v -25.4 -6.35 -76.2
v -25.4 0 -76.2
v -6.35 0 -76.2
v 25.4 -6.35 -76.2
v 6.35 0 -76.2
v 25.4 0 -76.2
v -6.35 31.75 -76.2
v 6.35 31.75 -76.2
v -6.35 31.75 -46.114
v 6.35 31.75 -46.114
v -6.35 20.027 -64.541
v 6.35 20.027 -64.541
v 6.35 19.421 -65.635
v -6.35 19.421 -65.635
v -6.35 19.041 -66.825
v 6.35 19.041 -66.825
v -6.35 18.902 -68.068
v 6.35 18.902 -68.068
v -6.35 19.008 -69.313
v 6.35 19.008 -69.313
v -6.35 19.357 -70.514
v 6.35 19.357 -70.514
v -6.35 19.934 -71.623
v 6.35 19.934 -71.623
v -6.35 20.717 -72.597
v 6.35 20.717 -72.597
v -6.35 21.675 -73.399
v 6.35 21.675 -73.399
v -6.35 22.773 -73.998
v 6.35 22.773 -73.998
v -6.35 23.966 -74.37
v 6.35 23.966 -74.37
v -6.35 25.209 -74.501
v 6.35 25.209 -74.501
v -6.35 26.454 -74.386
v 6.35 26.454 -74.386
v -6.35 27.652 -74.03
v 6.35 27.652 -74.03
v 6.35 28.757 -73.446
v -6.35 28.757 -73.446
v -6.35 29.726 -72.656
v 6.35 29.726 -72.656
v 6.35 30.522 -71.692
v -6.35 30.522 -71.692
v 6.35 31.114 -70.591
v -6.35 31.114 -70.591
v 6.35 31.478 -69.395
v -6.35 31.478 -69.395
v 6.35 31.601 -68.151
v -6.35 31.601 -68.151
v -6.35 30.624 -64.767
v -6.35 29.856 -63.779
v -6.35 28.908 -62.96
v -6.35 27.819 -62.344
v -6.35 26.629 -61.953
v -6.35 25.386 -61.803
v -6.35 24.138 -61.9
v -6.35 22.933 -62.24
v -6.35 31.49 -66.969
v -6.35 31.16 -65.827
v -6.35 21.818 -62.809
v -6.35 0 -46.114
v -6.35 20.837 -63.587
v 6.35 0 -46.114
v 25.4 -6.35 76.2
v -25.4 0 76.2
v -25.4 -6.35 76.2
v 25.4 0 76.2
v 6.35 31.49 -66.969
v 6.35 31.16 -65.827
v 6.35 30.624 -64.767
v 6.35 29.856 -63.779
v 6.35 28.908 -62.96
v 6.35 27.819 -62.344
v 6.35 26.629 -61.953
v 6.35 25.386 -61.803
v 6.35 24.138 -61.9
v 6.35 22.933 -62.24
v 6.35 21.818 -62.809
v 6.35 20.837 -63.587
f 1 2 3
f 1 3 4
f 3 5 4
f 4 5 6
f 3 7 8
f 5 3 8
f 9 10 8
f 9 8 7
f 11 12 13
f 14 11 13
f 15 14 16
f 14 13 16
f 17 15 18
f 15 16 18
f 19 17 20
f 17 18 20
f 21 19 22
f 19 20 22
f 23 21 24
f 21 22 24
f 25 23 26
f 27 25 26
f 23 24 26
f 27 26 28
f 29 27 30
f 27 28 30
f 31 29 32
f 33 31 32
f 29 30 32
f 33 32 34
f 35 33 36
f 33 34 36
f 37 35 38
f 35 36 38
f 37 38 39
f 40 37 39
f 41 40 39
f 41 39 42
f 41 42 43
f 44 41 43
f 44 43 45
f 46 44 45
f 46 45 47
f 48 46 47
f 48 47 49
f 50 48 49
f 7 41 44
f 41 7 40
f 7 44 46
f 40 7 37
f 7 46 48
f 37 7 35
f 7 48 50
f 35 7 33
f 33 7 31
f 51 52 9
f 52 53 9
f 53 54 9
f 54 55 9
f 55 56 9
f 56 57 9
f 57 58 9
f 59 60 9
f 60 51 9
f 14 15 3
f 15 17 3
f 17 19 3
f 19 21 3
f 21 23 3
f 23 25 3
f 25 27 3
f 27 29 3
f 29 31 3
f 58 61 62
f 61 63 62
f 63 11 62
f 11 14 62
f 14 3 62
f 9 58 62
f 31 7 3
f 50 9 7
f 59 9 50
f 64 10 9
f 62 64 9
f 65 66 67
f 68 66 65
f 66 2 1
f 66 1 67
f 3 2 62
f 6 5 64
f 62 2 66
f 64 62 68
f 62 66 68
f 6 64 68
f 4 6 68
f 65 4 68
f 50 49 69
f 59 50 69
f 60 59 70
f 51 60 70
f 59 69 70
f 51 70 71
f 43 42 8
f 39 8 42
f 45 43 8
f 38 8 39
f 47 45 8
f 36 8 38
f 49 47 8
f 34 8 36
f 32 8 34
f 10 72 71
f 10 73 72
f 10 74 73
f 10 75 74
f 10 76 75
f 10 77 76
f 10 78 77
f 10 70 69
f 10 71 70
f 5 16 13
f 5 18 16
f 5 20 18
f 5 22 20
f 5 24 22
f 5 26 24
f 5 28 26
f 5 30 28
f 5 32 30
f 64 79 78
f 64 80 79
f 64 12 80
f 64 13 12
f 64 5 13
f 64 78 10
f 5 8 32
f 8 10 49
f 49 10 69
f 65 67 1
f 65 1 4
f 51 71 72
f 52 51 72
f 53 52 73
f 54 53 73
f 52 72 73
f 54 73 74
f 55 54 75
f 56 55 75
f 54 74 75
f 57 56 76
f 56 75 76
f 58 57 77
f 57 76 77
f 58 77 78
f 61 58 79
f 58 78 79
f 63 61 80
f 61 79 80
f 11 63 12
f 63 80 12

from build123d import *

# Parameters (mm, degrees)
F0_W     = 50.8
F0_H     = 152.4
F1_DEPTH = 6.35
F2_W     = 12.7
F2_H     = 30.0863
F3_DEPTH = 31.75
F6_DEPTH = 31.751


with BuildPart() as f1:
    # F0 (on Front) → F1 (new body)
    with BuildSketch(Plane.XZ):
        Rectangle(F0_W, F0_H)
    extrude(amount=F1_DEPTH)

    # F2 (on face) → F3 (join)
    with BuildSketch(Plane(origin=(0, 0, 0), x_dir=(-1, 0, 0), z_dir=(0, 1, 0))):
        with Locations((0, -61.15685)):
            Rectangle(F2_W, F2_H)
    extrude(amount=F3_DEPTH)

    # F5 (on face) → F6 (cut, through all)
    with BuildSketch(Plane.YZ.offset(6.35)):
        with BuildLine():
            ThreePointArc((20.0271333182, -64.5413445885), (25.26483083, -67.5054111988), (30.6239423072, -64.7669645094))
            ThreePointArc((30.6239423072, -64.7669645094), (25.3862447954, -61.802897899), (20.0271333182, -64.5413445885))
        make_face()
        with BuildLine():
            ThreePointArc((20.0271333182, -64.5413445885), (23.3602469249, -74.2134114917), (31.6010756254, -68.1514590979))
            ThreePointArc((31.6010756254, -68.1514590979), (31.3519035786, -66.3900964761), (30.6239423072, -64.7669645094))
            ThreePointArc((30.6239423072, -64.7669645094), (25.26483083, -67.5054111988), (20.0271333182, -64.5413445885))
        make_face()
    extrude(amount=-F6_DEPTH, mode=Mode.SUBTRACT)


solid = f1.part
